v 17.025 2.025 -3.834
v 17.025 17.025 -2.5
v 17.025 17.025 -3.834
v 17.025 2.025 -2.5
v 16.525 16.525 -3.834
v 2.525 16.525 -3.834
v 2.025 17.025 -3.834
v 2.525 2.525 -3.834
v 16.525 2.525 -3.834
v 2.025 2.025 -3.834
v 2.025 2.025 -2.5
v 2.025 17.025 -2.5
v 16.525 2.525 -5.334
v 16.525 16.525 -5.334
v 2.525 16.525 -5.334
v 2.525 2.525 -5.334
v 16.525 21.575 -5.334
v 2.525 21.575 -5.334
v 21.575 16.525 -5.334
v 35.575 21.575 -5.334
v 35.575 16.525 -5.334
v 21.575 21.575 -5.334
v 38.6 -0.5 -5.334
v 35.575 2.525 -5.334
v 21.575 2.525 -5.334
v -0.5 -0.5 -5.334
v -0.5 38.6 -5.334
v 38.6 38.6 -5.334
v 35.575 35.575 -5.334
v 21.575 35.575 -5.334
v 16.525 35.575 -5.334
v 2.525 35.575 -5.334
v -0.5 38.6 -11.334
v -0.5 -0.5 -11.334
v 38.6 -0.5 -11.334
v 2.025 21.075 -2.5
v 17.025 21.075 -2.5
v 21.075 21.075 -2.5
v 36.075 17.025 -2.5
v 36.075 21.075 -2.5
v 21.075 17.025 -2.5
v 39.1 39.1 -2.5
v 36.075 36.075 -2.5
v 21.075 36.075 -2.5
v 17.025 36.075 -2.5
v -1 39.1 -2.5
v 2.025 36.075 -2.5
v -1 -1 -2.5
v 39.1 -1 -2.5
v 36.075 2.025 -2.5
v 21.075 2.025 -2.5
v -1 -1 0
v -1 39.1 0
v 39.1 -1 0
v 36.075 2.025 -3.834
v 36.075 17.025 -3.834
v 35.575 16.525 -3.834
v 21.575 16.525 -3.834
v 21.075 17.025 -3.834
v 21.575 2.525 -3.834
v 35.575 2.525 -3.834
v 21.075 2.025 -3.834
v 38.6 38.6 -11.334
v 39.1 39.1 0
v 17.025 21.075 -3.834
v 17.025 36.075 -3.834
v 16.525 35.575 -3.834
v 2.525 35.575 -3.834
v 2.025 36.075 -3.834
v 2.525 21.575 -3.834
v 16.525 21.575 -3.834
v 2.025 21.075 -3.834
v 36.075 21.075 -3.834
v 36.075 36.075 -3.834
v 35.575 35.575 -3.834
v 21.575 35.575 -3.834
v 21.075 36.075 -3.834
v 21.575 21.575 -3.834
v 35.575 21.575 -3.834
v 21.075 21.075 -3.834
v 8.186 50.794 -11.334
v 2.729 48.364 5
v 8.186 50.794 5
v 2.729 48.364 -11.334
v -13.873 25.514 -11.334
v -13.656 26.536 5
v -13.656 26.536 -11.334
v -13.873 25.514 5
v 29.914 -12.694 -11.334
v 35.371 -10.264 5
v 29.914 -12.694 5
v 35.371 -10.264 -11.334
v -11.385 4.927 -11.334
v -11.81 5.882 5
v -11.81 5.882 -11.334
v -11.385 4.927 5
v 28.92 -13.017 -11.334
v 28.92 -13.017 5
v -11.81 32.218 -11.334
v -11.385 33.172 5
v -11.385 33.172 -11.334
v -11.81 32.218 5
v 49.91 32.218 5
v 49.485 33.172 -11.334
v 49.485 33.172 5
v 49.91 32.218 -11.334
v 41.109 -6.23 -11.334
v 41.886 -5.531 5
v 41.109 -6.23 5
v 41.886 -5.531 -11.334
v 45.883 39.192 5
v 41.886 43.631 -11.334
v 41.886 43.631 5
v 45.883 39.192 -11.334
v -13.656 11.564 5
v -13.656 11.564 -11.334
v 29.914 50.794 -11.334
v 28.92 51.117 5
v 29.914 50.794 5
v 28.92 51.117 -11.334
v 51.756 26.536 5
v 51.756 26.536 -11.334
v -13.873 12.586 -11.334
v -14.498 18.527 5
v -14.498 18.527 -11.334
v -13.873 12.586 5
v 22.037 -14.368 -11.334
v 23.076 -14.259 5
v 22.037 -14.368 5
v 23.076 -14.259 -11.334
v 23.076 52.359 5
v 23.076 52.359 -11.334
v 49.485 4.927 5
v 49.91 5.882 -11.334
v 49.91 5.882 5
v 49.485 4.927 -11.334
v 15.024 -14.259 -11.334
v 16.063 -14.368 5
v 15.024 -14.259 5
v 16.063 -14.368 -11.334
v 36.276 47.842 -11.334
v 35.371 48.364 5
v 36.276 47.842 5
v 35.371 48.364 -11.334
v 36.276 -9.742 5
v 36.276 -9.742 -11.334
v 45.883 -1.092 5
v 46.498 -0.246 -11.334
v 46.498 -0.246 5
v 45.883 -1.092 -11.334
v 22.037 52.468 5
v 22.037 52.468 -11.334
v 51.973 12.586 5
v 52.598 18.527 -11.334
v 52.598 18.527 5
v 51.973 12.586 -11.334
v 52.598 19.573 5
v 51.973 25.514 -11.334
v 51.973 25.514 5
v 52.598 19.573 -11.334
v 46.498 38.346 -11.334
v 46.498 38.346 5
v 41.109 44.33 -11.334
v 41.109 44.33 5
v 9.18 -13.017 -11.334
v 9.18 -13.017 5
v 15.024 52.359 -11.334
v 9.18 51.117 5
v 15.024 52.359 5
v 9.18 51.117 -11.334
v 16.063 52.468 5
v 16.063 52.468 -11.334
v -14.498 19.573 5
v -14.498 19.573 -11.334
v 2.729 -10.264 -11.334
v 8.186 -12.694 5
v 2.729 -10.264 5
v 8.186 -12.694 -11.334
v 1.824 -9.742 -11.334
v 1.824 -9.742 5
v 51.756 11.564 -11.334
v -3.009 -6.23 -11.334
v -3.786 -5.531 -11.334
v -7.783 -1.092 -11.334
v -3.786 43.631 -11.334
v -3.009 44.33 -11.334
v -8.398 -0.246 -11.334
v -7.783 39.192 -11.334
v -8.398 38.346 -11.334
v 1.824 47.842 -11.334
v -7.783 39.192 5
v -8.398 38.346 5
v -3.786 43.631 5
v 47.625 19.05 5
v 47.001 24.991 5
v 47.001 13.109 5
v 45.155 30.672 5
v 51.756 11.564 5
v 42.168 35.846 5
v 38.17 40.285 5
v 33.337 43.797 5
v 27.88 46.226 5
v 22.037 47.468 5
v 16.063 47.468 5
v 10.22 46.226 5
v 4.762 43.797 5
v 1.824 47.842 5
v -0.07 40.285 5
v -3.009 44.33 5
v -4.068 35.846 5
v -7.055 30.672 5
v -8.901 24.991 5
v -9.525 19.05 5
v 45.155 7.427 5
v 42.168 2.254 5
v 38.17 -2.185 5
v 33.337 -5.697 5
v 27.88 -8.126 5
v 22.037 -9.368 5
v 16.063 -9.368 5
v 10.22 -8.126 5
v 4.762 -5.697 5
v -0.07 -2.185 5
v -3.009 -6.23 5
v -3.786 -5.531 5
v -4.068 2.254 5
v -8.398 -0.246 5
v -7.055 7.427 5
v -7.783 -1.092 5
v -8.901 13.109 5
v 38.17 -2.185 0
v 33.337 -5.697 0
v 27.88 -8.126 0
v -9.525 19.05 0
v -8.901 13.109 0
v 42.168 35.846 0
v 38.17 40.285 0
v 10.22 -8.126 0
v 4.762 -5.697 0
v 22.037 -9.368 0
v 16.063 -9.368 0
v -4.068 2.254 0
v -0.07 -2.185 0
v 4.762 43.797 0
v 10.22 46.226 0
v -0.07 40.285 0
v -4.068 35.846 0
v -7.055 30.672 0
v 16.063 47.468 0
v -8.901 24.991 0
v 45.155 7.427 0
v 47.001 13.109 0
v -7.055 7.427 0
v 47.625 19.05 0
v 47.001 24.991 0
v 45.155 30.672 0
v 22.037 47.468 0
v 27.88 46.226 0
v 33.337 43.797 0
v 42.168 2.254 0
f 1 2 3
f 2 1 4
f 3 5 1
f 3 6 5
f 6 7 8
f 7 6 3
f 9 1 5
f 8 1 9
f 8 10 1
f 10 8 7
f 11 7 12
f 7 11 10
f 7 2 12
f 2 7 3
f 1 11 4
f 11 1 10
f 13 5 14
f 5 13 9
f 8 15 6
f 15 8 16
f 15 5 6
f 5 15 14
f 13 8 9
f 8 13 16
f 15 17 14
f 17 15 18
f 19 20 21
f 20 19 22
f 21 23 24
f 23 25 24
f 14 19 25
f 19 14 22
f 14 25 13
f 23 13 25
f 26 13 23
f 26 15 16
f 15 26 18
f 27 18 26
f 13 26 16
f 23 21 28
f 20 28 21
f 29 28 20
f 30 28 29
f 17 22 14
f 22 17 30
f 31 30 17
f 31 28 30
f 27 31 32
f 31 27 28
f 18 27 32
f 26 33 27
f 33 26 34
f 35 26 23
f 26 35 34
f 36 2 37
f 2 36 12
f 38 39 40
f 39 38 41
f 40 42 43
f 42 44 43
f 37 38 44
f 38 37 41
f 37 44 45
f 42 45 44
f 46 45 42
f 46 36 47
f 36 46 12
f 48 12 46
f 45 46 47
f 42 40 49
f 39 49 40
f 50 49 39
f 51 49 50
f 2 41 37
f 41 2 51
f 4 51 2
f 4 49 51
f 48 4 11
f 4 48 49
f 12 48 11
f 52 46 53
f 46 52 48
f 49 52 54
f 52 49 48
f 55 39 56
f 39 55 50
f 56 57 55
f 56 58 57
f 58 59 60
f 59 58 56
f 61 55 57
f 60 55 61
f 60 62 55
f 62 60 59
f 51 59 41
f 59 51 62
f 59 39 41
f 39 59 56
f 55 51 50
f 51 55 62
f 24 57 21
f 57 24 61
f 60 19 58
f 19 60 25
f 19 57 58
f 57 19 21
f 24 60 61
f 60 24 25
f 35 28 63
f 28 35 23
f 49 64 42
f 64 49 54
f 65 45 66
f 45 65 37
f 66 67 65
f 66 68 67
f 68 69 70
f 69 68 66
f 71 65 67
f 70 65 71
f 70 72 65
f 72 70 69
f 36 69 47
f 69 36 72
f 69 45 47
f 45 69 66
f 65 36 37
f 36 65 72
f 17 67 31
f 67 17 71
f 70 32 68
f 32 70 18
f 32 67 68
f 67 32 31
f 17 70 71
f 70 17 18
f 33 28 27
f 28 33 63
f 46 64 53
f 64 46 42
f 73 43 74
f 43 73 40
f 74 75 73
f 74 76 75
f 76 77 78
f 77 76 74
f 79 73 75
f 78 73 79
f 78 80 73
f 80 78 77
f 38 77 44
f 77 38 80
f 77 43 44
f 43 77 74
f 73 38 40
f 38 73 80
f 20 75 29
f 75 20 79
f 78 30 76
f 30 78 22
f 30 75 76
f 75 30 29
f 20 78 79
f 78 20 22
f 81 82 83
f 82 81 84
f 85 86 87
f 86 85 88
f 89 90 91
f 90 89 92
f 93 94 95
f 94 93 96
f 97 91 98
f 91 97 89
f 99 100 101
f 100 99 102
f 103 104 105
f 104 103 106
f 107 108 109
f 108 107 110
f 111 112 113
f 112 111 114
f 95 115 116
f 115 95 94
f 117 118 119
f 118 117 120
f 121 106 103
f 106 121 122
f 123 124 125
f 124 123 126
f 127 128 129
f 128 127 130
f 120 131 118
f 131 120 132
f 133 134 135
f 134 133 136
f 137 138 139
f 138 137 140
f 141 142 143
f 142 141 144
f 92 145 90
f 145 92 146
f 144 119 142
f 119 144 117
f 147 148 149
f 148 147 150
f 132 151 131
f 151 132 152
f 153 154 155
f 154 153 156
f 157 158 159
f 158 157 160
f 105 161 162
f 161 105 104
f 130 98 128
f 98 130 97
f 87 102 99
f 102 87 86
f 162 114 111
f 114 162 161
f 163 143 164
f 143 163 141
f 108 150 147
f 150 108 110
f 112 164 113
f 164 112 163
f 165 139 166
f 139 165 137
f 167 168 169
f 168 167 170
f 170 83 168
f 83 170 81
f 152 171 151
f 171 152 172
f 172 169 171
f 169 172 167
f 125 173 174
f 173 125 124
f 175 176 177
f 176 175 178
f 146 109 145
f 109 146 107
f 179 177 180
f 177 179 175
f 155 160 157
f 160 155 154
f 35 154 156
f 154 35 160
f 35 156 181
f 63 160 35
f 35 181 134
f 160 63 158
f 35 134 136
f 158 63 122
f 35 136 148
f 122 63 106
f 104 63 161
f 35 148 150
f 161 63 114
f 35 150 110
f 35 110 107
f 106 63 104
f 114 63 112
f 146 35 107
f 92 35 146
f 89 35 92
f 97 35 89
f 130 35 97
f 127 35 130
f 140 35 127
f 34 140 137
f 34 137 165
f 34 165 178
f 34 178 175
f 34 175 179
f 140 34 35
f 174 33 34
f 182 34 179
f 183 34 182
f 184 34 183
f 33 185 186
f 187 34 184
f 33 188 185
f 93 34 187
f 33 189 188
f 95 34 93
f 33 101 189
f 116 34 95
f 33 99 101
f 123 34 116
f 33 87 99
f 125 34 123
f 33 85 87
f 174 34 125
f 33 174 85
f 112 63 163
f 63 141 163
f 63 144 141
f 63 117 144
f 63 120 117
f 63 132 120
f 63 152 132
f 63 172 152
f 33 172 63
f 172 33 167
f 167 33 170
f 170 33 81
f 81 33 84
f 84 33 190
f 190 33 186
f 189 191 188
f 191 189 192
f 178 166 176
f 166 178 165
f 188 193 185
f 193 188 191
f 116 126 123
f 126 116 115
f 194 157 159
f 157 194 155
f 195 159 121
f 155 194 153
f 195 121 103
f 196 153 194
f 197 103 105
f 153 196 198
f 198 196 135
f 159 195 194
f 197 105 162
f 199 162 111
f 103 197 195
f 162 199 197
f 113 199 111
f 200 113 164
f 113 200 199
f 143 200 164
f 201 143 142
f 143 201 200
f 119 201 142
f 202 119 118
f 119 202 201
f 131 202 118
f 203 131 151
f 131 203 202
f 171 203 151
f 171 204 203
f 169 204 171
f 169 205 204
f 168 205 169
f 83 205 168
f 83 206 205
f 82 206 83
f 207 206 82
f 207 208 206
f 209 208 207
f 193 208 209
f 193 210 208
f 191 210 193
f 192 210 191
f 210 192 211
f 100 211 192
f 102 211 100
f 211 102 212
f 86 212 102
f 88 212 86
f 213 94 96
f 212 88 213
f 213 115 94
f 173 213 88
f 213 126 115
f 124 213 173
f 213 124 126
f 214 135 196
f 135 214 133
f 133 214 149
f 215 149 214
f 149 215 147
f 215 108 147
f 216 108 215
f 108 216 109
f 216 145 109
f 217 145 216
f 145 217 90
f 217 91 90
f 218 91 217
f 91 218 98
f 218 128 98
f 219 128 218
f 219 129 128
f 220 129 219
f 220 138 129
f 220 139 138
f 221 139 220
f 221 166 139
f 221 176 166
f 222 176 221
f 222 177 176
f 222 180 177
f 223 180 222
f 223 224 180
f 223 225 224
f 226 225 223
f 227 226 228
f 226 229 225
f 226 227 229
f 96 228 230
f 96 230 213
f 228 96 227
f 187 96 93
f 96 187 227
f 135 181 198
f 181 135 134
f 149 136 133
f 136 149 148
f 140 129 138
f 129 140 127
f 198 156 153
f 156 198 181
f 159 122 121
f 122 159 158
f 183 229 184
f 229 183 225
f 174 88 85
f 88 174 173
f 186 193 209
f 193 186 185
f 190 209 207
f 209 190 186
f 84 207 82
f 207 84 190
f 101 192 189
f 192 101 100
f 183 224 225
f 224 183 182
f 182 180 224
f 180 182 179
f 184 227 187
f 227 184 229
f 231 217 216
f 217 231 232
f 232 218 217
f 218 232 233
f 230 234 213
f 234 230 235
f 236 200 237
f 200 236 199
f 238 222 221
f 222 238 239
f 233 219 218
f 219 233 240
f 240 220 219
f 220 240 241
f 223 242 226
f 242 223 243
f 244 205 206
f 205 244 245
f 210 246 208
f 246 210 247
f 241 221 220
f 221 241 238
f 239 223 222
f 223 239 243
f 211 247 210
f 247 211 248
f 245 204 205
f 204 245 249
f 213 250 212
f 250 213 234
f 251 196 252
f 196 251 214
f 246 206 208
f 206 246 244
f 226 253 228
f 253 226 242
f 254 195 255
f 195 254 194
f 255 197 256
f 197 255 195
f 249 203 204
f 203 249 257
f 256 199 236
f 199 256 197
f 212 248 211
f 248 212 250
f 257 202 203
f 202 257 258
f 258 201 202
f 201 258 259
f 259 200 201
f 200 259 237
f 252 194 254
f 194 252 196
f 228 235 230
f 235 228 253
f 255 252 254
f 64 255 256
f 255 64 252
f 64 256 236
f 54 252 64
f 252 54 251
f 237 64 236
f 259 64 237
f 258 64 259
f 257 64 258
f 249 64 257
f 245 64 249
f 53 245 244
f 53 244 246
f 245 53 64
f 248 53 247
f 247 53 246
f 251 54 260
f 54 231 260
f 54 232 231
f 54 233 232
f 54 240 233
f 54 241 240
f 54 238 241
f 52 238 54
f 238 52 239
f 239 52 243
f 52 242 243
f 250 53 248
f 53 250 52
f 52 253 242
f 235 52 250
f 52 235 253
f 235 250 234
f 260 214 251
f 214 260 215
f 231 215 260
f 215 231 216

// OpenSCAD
// file: ../../lib/circuits/helpers.scad
function bu(u) = u * 2.54;

module breadboard_row(number, orientation="vertical") {
  children();
  if(number > 1) {
    if(orientation == "vertical") {
      translate([0,bu(1),0])
        breadboard_row(number-1, orientation=orientation) {
          children();
        }
    } else {
      translate([bu(1),0,0])
        breadboard_row(number-1, orientation=orientation){
          children();
        }
    }
  }
}
// file: ../../lib/switches/rgb.scad
include <../variables.scad>

module rgb_row_trace_connection(width, height, xpos, ypos, rgb, connections) {
  half_width = u_mm(width)/2;
  half_height = u_mm(height)/2;
  if(connections[3] == "connect") {
    translate([1-half_width,8.875,0]){
      circle(d=0.8,$fn=40);
      offset(0.4)
        polygon(points=[[0,-0.01],[0,0.01],[u_mm(-xpos)-2, u_mm(-ypos)+0.01],[u_mm(-xpos)-2, u_mm(-ypos)-0.01]]);
    }
    translate([1-half_width,4.9,0]){
      circle(d=0.8,$fn=40);
      offset(0.4)
        polygon(points=[[0,-0.01],[0,0.01],[u_mm(-xpos)-2, u_mm(-ypos)+0.01],[u_mm(-xpos)-2, u_mm(-ypos)-0.01]]);
    }
    translate([1-half_width,3.3,0]){
      circle(d=0.8,$fn=40);
      offset(0.4)
        polygon(points=[[0,-0.01],[0,0.01],[u_mm(-xpos)-2, u_mm(-ypos)+0.01],[u_mm(-xpos)-2, u_mm(-ypos)-0.01]]);
    }
  }
  if(connections[2] == "connect") {
    translate([half_width-1,8.875,0]) {
      circle(d=0.8,$fn=40);
    }
    translate([half_width-1,4.9,0]) {
      circle(d=0.8,$fn=40);
    }
    translate([half_width-1,3.3,0]){
      circle(d=0.8,$fn=40);
    }
  }
}

module rgb_pcb_drill(width=1, height=1, rgb=true, connections=["hole","hole","hole","hole"]) {
  half_width = u_mm(width)/2;
  half_height = u_mm(height)/2;
  translate([half_width,half_height,0]) {
    if(rgb == true) {
      // LED Hole
      translate([-1.875,3.4])
        square([3.75,3]);

      // LED D
      if(connections[3] == "hole")
        translate([1.3-half_width,8,0])
          circle(d=1,$fn=40);
      if(connections[2] == "hole")
        translate([half_width-1.3,8,0])
          circle(d=1,$fn=40);

      // LED G
      if(connections[3] == "hole")
        translate([1.3-half_width,5.4,0])
          circle(d=1,$fn=40);
      if(connections[2] == "hole")
        translate([half_width-1.3,5.4,0])
          circle(d=1,$fn=40);

      // LED V
      if(connections[3] == "hole")
        translate([1.3-half_width,2.8,0])
          circle(d=1,$fn=40);
      if(connections[2] == "hole")
        translate([half_width-1.3,2.8,0])
          circle(d=1,$fn=40);
    }

    children();
  }
}

module rgb_pcb_hole_traces(width=1, height=1, rgb=true, xpos=0, ypos=0, connections=["hole","hole","hole","hole"]) {
  half_width = u_mm(width)/2;
  half_height = u_mm(height)/2;
  translate([half_width,half_height,0]) {
    if(rgb == true) {
      // LED D
      if(connections[3] == "hole")
        translate([1.3-half_width,8,0])
          circle(d=2.5,$fn=40);
      if(connections[2] == "hole")
        translate([half_width-1.3,8,0])
          circle(d=2.5,$fn=40);

      // LED G
      if(connections[3] == "hole")
        translate([1.3-half_width,5.4,0])
          circle(d=2.5,$fn=40);
      if(connections[2] == "hole")
        translate([half_width-1.3,5.4,0])
          circle(d=2.5,$fn=40);

      // LED V
      if(connections[3] == "hole")
        translate([1.3-half_width,2.8,0])
          circle(d=2.5,$fn=40);
      if(connections[2] == "hole")
        translate([half_width-1.3,2.8,0])
          circle(d=2.5,$fn=40);
    }

    children();
  }
}

module rgb_pcb_traces(width=1, height=1, rgb=true, xpos=0, ypos=0, connections=["hole","hole","hole","hole"]) {
  half_width = u_mm(width)/2;
  half_height = u_mm(height)/2;
  rgb_pcb_hole_traces(width=width, height=height, rgb=rgb, connections=connections) {
    if(rgb == true) {
      rgb_row_trace_connection(width=width, height=height, xpos=xpos, ypos=ypos, rgb=rgb, connections=connections);
      v_left = connections[3] == "none" ? 1 : half_width-5;
      // LED G
      translate([1.25,5])
        square([2,2]);
      translate([2.7,8.5,0]) {
        length = connections[2] == "none" ? 2 : half_width-3.7; 
        square([length,0.75]);
      }
      translate([2.7,6.8])
        square([0.8,2.4]);
      translate([-3.5,6.2])
        square([7,0.8]);
      translate([-3.5,6.8])
        square([0.8,2.4]);
      translate([-4-v_left,8.5,0])
        square([v_left+1,0.75]);

      // LED D
      translate([-4-v_left,4.5,0])
        square([v_left,0.8]);
      translate([-4.5,4.5,0])
        square([0.8,1.3]);
      translate([-4.5,5,0])
        square([1.3,0.8]);
      translate([2,4,0])
        square([2,0.8]);
      translate([4,4,0])
        square([0.8,1.3]);
      translate([4,4.5,0]) {
        length = connections[2] == "none" ? 0 : half_width-5; 
        square([length,0.75]);
      }
      translate([-3.375,5])
        square([2,1.1]);
      translate([1.25,3.75])
        square([2,1.1]);

      // LED V
      v_right = connections[2] == "none" ? 0 : half_width-5.25;
      translate([-4-v_left,2.9,0])
        square([v_right+v_left+8.875,0.8]);
      translate([-3.375,3.5])
        square([2,1.35]);
    }

    children();
  }
}
// file: ../../lib/switches/base.scad
include <../variables.scad>
include <rgb.scad>

// ["top", "bottom", "left", "right"]

module switch_row_trace_connection(width, height, xpos, ypos, rgb, connections) {
  half_width = u_mm(width)/2;
  half_height = u_mm(height)/2;
  if(connections[3] == "connect") {
    translate([1-half_width,-5.5,0]){
      circle(d=0.8,$fn=40);
      offset(0.4)
        polygon(points=[[0,-0.01],[0,0.01],[u_mm(-xpos)-2, u_mm(-ypos)+0.01],[u_mm(-xpos)-2, u_mm(-ypos)-0.01]]);
    }
  }
  if(connections[2] == "connect") {
    translate([half_width-1,-5.5,0]) {
      circle(d=0.8,$fn=40);
    }
  }
}

module switch_column_trace_connection(width, height, xpos, ypos, rgb, connections, last_xpos=0, last_ypos=0) {
  half_width = u_mm(width)/2;
  half_height = u_mm(height)/2;
  if(connections[1] == "connect") {
    translate([-u_mm((width-1)/2)-0.9,half_height-1,0]) {
      circle(d=0.8,$fn=40);
      offset(0.4)
        polygon(points=[[0,-0.01],[0,0.01],[u_mm((width-1)/2),0.01],[u_mm((width-1)/2),-0.01]]);
    }
  }
  if(connections[0] == "connect") {
    y_off = u_mm(ypos-last_ypos);
    x_off = u_mm(last_xpos-xpos);
    translate([-0.875,-1-y_off-half_height,0]) {
      offset(0.4)
        polygon(points=[[-0.01+x_off,0],[0.01+x_off,0],[0.01,2+y_off],[-0.01,2+y_off]]);
      translate([x_off-0.01,0]) {
        offset(0.4)
          polygon(points=[[0,-0.01],[0,0.01],[u_mm((width-1)/2)+1,0.01],[u_mm((width-1)/2)+1,-0.01]]);
      }
    }
  }
}

module switch_base_pcb_drill(width=1, height=1, rgb=true, single=true, connections=["hole","hole","hole","hole"]) {
  half_width = u_mm(width)/2;
  half_height = u_mm(height)/2;
  rgb_pcb_drill(width=width, height=height, rgb=rgb, connections=connections) {
    // Row
    if(connections[2] == "hole")
      translate([half_width-1.3,-5.5,0])
        circle(d=1,$fn=40);
    if(connections[3] == "hole")
      translate([1.3-half_width,-5.5,0])
        circle(d=1,$fn=40);

    // Column
    if(connections[1] == "hole")
      translate([-1,half_height-1.25,0])
        circle(d=1,$fn=40);
    if(connections[0] == "hole")
      translate([-1,1.25-half_height,0])
        circle(d=1,$fn=40);

    children();
  }
}

module switch_base_pcb_traces(width=1, height=1, rgb=true, xpos=0, ypos=0, connections=["hole","hole","hole","hole"], last_xpos=0, last_ypos=0, single=true) {
  half_width = u_mm(width)/2;
  half_height = u_mm(height)/2;
  rgb_pcb_traces(width=width, height=height, rgb=rgb, xpos=xpos, ypos=ypos, connections=connections) {
    switch_row_trace_connection(width, height, xpos, ypos, rgb, connections);
    if(single && !rgb)
      switch_column_trace_connection(width, height, xpos, ypos, rgb, connections, last_xpos=last_xpos, last_ypos=last_ypos);

    // Row
    if(connections[2] == "hole")
      translate([half_width-1.3,-5.5,0])
        circle(d=2.5,$fn=40);
    if(connections[3] == "hole")
      translate([1.3-half_width,-5.5,0])
        circle(d=2.5,$fn=40);

    // Column
    if(connections[1] == "hole")
      translate([-1,half_height-1.25,0])
        circle(d=2.4,$fn=40);
    if(connections[0] == "hole")
      translate([-1,1.25-half_height,0])
        circle(d=2.4,$fn=40);

    children();
  }
}

module switch_base_pcb_traces_bottom(width=1, height=1, rgb=true, xpos=0, ypos=0, connections=["hole","hole","hole","hole"], last_xpos=0, last_ypos=0) {
  half_width = u_mm(width)/2;
  half_height = u_mm(height)/2;
  rgb_pcb_hole_traces(width=width, height=height, rgb=rgb, connections=connections) {
    switch_column_trace_connection(width, height, xpos, ypos, rgb, connections, last_xpos=last_xpos, last_ypos=last_ypos);

    // Row
    if(connections[2] == "hole")
      translate([half_width-1.3,-5.5,0])
        circle(d=2.5,$fn=40);
    if(connections[3] == "hole")
      translate([1.3-half_width,-5.5,0])
        circle(d=2.5,$fn=40);

    // Column
    if(connections[1] == "hole")
      translate([-1,half_height-1.25,0])
        circle(d=2.5,$fn=40);
    if(connections[0] == "hole")
      translate([-1,1.25-half_height,0])
        circle(d=2.5,$fn=40);

    children();
  }
}
// file: ../../lib/switches/footprints.scad
include <../variables.scad>
include <stabilizers.scad>

module pcb_switch_outline(width=1, height=1) {
  stab_extra = width >= 2 ? 2 : 0;
  translate([0,-stab_extra])
    square([u_mm(width)+0.01, u_mm(height)+0.01+stab_extra]);
}

module pcb_switch_space_outline(width=1, height=1, style="mx", cnc=false) {
  offset = height_for_style(style);
  stab_extra = width >= 2 ? 2 : 0;
  translate([-1,-1-stab_extra,2.834-offset])
    cube([u_mm(width) + 2, u_mm(height) + 2 + stab_extra, 1.166+offset]);
  translate([u_mm(width/2),u_mm(height/2)]) {
    translate([-7.5,-7.5,1.5-offset])
      cube([15,15,5]);
    translate([-7,-7,-10])
      cube([14,14,10]);
    translate([u_mm(-width/2)-0.5,u_mm(-height/2)-0.5,-20-offset])
      cube([u_mm(width)+1,u_mm(height)+1, 20]);
  }
  translate([hole_offset(width), hole_offset(height),-10])
    stab(width);
}
// file: ../../lib/switches/stabilizers.scad
module stab_hole_render(distance){
  translate([14+distance+3.375,6.99,0]) {
    circle(d=3.175, $fn=40);
    translate([0,-15.24,0])
      circle(d=4.064, $fn=40);
  }
  translate([-6.75-distance+3.375,6.99,0]) {
    circle(d=3.175, $fn=40);
    translate([0,-15.24,0])
      circle(d=4.064, $fn=40);
  }
}

module stab_holes(width) {
  if (width >= 7) {
    stab_hole_render(39.6);
  } else if (width >= 6) {
    stab_hole_render(39.6);
  } else if(width >= 2) {
    stab_hole_render(1.6);
  }
}

module stab_render(distance, cnc=false, height=5.334) {
  translate([14+distance,1.47,0]){
    // Right Side Large Hole
    cube([6.75,12.3,10]);

    // Add 1/16" corner holes for milling
    if(cnc){
      translate([0.56,0.56,0])
        cylinder(h=10,d=1.59,$fn=20);
      translate([6.75-0.56,0.56,0])
        cylinder(h=10,d=1.59,$fn=20);
      translate([0.56,12.3-0.56,0])
        cylinder(h=10,d=1.59,$fn=20);
      translate([6.75-0.56,12.3-0.56,0])
        cylinder(h=10,d=1.59,$fn=20);
    }
    translate([5.75,3.23,0]){
      // Side hole for notch
      cube([1.825,3.175,10]);
      translate([1.825,1.59,0])
        if(cnc)
          resize([1.59,3.175,10])
            cylinder(h=10,d=1.59,$fn=20);
    }
    translate([1.725,11.3,0]){
      // Top Notch
      cube([3.3,2.2,10]);
      if(cnc)
        translate([1.65,2.2,0])
          resize([3.3,1,10])
            cylinder(h=10,d=1,$fn=20);
    }
    // Thin out for clip
    translate([-1,-1,10-height+1.5])
      cube([8.75,14.3,height-1.5]);
  }
  translate([-6.75-distance,1.47,0]){
    // Left Side Large Hole
    cube([6.75,12.3,10]);
    translate([-0.825,3.23,0]){
      // Side hole for notch
      cube([1.825,3.175,10]);
      if(cnc)
        translate([0,1.59,0])
          resize([1.59,3.175,10])
            cylinder(h=10,d=1.59,$fn=20);

    }
    translate([1.725,11.3,0]){
      // Top Notch
      cube([3.3,2.2,10]);
      if(cnc)
        translate([1.65,2.2,0])
          resize([3.3,1,10])
            cylinder(h=10,d=1,$fn=20);
    }
    if(cnc){
      translate([0.56,0.56,0])
        cylinder(h=10,d=1.59,$fn=20);
      translate([6.75-0.56,0.56,0])
        cylinder(h=10,d=1.59,$fn=20);
      translate([0.56,12.3-0.56,0])
        cylinder(h=10,d=1.59,$fn=20);
      translate([6.75-0.56,12.3-0.56,0])
        cylinder(h=10,d=1.59,$fn=20);
    }
    // Thin out for clip
    translate([-1,-1,10-height+1.5])
      cube([8.75,14.3,height-1.5]);
  }
  // Center shaft for bar
  translate([-distance-2,4.7,0]){
    cube([distance*2+20,4.6,10]);
  }
}

module stab(key_width, cnc=false) {
  if (key_width >= 7) {
    stab_render(39.6, cnc=cnc);
  } else if (key_width >= 6) {
    stab_render(39.6, cnc=cnc);
  } else if(key_width >= 2) {
    stab_render(1.6, cnc=cnc);
  }
}
// file: ../../lib/circuits/wire.scad
module guage(guage=12) {
  fn=20;
  if(guage == 8) {
    circle(d=3.25, $fn=fn);
  } else if (guage == 10) {
    circle(d=2.59, $fn=fn);
  } else if (guage == 12) {
    circle(d=2.06, $fn=fn);
  } else if (guage == 14) {
    circle(d=1.57, $fn=fn);
  } else if (guage == 16) {
    circle(d=1.3, $fn=fn);
  }
}

module wire_pcb_drill(guage=12) {
  offset(0.1)
    guage(guage);
}

module wire_pcb_traces(guage=12) {
  offset(0.75)
    guage(guage);
}

module wire_pcb_outline(guage=12) {
  offset(1.5)
    guage(guage);
}

module wire_space_outline(guage=12) {
  linear_extrude(10)
    offset(0.1)
      guage(guage);
}
// file: ../../lib/circuits/trrs.scad
module trrs_post(d=1.2) {
  translate([0,-d/4,0]) {
    circle(d=d, $fn=20);
    translate([-d/2,0,0]) {
      square([d,(d/2-.2)]);
    }
    translate([0,(d/2-.2),0]) {
      circle(d=d, $fn=20);
    }
  }
}

module trrs_pcb_drill(side="left") {
  translate([2.8,1.5]) {
    circle(d=2, $fn=20);
  }
  translate([2.8,8.5]) {
    circle(d=2, $fn=20);
  }
  translate([0.5,11.3,0]) {
    trrs_post();
  }
  translate([5.1,3.2,0]) {
    trrs_post();
  }
  translate([5.1,6.2,0]) {
    trrs_post();
  }
  translate([5.1,10.2,0]) {
    trrs_post();
  }
  if(side != "none"){
    offset = side == "left" ? 7.6 : -2;
    translate([offset,11.3]) {
      circle(d=1.2, $fn=20);
    }
    translate([offset,8.3]) {
      circle(d=1.2, $fn=20);
    }
    translate([offset,5.3]) {
      circle(d=1.2, $fn=20);
    }
    translate([offset,2.2]) {
      circle(d=1.2, $fn=20);
    }
  }
}

module trrs_pcb_traces(side="left") {
  translate([-1,9.7,0]){
    difference() {
      square([3,3]);
      if(side == "right") {
        translate([3,-1.8]) {
          rotate(45) {
            square(2);
          }
        }
      }
    }
  }
  translate([3.6,1.2,0]){
    difference() {
      square([3,3.5]);
      if(side == "left") {
        translate([3,2.3]) {
          rotate(45) {
            square(2);
          }
        }
      }
    }
  }
  translate([3.6,4.8,0]){
    difference() {
        square([3,3.5]);
        if(side == "left") {
          translate([3,2.3]) {
            rotate(45) {
              square(2);
            }
          }
        }
    }
  }
  translate([3.6,8.4,0]){
    difference() {
      square([3,3.2]);
      if(side == "left") {
        translate([3,1.8]) {
          rotate(45) {
            square(2);
          }
        }
      }
    }
  }
  if(side != "none"){
    translate([side == "left" ? 7.6 : -2,0,0]){
      translate([0,11.3]) {
        circle(d=3, $fn=20);
      }
      translate([0,8.3]) {
        circle(d=2.9, $fn=20);
      }
      translate([0,5.3]) {
        circle(d=3, $fn=20);
      }
      translate([0,2.2]) {
        circle(d=3, $fn=20);
      }
    }
    translate([side == "left" ? 5.6 : -2,0,0]){
      left_trace = side == "left" ? 2.5 : 7.6;
      translate([0,2.2]) {
        square([left_trace,1.5]);
      }
      translate([0,5.1]) {
        square([left_trace,1.5]);
      }
      if(side == "left") {
        translate([0,8.7]) {
          square([left_trace,0.9]);
        }
      }
      else {
        translate([0,8]) {
          square([4,1.6]);
        }
        translate([4,9]) {
          square([4,1.6]);
        }
        translate([2.8,9.4]) {
          rotate(-45) {
            square([1,1.7]);
          }
        }
      }
    }
    translate([side == "left" ? 0.5 : -2,0,0]){
      right_trace = side == "left" ? 7.1 : 2;
      translate([0,11.7]) {
        square([right_trace,1.3]);
      }
      translate([0,12]) {
        circle(1, $fn=20);
      }
      translate([right_trace,11.8]) {
        circle(1, $fn=20);
      }
    }
  }
}

module trrs_pcb_outline(side="left") {
  translate([-1,0,0]) {
    square([7.6,13.1]);
  }
  if(side != "none"){
    translate([side == "left" ? 5.6 : -3.5, 0]) {
      square([4,13.1]);
    }
  }
}

module trrs_space_outline(side="left") {
  translate([0,0,-5.3]) {
    linear_extrude(7){
      translate([-2,-1,0])
        square([9.6,15.1]);
      translate([0,-12.1,0])
        square([5.6,12.1]);
      if(side != "none")
        translate([side == "left" ? 5.6 : -4.5, -1])
          square([5,15.1]);
    }
  }
  translate([3,-2,-2.6]) {
    rotate([90,0,0]) {
      cylinder(d=10, h=30, $fn=100);
    }
  }
}
// file: ../../lib/circuits/trace.scad
function vdef(vector, index) = len(vector) == index ? vector[index-1] : vector[index];
function vadd(vector, index, axis) = vdef(vector, index)[axis] > vdef(vector, index-1)[axis] ? 0.01 : -0.01;
function polygon_from_vector(vector) = 
  len(vector) > 0 ?
    concat(vector, 
      [for (i = [1:len(vector)]) 
        [vector[len(vector)-i][0]-vadd(vector, i, 0),vector[len(vector)-i][1]-vadd(vector, i, 1)]])
      : [];

function parse_loc(loc) = [
  loc[5],
  len(loc) < 7 ? "both" : loc[6],
  len(loc) < 8 ? "none" : loc[7],
];

module manual_trace_pcb_drill(location) {
  vector = parse_loc(location)[0];
  echo("holes", parse_loc(location)[2]);
  if(parse_loc(location)[2] == "holes" || parse_loc(location)[2] == "hole_begin") {
    translate(vector[0]) {
      circle(d=1, $fn=20);
    }
  }
  if(parse_loc(location)[2] == "holes" || parse_loc(location)[2] == "hole_end") {
    translate(vector[len(vector)-1]) {
      circle(d=1, $fn=20);
    }
  }
}

module manual_trace_pcb_traces(location) {
  vector = parse_loc(location)[0];
  if(parse_loc(location)[1] != "bottom") {
    offset(0.4) {
      polygon(points=polygon_from_vector(vector));
    }
  }
  if(parse_loc(location)[2] == "holes" || parse_loc(location)[2] == "hole_begin") {
    translate(vector[0]) {
      circle(d=2.5, $fn=20);
    }
  }
  if(parse_loc(location)[2] == "holes" || parse_loc(location)[2] == "hole_end") {
    translate(vector[len(vector)-1]) {
      circle(d=2.5, $fn=20);
    }
  }
}

module manual_trace_pcb_traces_bottom(location) {
  vector = parse_loc(location)[0];
  if(parse_loc(location)[1] != "top") {
    offset(0.4) {
      polygon(points=polygon_from_vector(vector));
    }
  }
  if(parse_loc(location)[2] == "holes" || parse_loc(location)[2] == "hole_begin") {
    translate(vector[0]) {
      circle(d=2.5, $fn=20);
    }
  }
  if(parse_loc(location)[2] == "holes" || parse_loc(location)[2] == "hole_end") {
    translate(vector[len(vector)-1]) {
      circle(d=2.5, $fn=20);
    }
  }
}

module manual_trace_pcb_outline(location) {
  vector = parse_loc(location)[0];
  echo("location", location);
  offset(1)
    polygon(points=polygon_from_vector(vector));

  if(parse_loc(location)[2] == "holes" || parse_loc(location)[2] == "hole_begin") {
    translate(vector[0]) {
      circle(d=4, $fn=20);
    }
  }
  if(parse_loc(location)[2] == "holes" || parse_loc(location)[2] == "hole_end") {
    translate(vector[len(vector)-1]) {
      circle(d=4, $fn=20);
    }
  }
}

module manual_trace_space_outline(location) {
  vector = parse_loc(location)[0];
  translate([0,0,-1])
    linear_extrude(2)
      offset(0.5)
        manual_trace_pcb_outline(vector);
}
// file: ../../lib/circuits/support.scad
module support_pcb_drill(mm=2) {
  offset(0.1)
    circle(d=mm, $fn=20);
}

module support_pcb_traces(mm=2) {
}

module support_pcb_outline(mm=2) {
  offset(2)
    circle(d=mm, $fn=20);
}

module support_space_outline(mm=2) {
  linear_extrude(10)
    offset(0.1)
      circle(d=mm, $fn=20);
}
// file: ../../lib/circuits/proton_c.scad
use <helpers.scad>

module proton_c_pcb_drill(size="full") {
  translate([bu(0.5),bu(1.5),0]) {
    translate([0,bu(1)])
      breadboard_row(4, "horizontal"){
        circle(d=1, $fn=20);
        translate([0,bu(1)])
          circle(d=1, $fn=20);
      }
    translate([bu(4),bu(1)])
      breadboard_row(2)
        circle(d=1, $fn=20);
    translate([bu(4),bu(3)])
      breadboard_row(2)
        circle(d=1, $fn=20);
    circle(d=1, $fn=20);
    translate([bu(1),0,0])
      circle(d=1, $fn=20);
    translate([bu(5),0,0])
      circle(d=1, $fn=20);
    translate([bu(6),0,0])
      circle(d=1, $fn=20);
    breadboard_row(12) {
      circle(d=1, $fn=20);
      translate([bu(1),0,0])
        circle(d=1, $fn=20);
      translate([bu(5),0,0])
        circle(d=1, $fn=20);
      translate([bu(6),0,0])
        circle(d=1, $fn=20);
    }
    if(size == "full")
      translate([0,bu(13)])
        breadboard_row(6) {
          circle(d=1, $fn=20);
          translate([bu(1),0,0])
            circle(d=1, $fn=20);
          translate([bu(5),0,0])
            circle(d=1, $fn=20);
          translate([bu(6),0,0])
            circle(d=1, $fn=20);
    }
  }
}

module proton_c_pcb_traces(size="full") {
  translate([bu(0.5),bu(1.5),0]) {
    translate([0,bu(1)])
      breadboard_row(4, "horizontal"){
        circle(d=2.4, $fn=20);
        translate([-1,0])
          square([2,bu(1)]);
        translate([0,bu(1)])
          circle(d=2.4, $fn=20);
      }
    translate([0,bu(1)])
      breadboard_row(2) {
        translate([bu(5),0])
          circle(d=2.4, $fn=20);
        translate([bu(5),-1,0])
          square([bu(1),2]);
        translate([bu(6),0,0])
          circle(d=2.4, $fn=20);
      }
    translate([bu(4),bu(1)]){
      translate([-0.75,-1])
        square([1.5,bu(2)-2]);
      breadboard_row(2)
        circle(d=2.4, $fn=20);
      translate([0,-0.75])
        square([bu(2),1.5]);
    }
    translate([bu(4),bu(3)]){
      translate([-0.75,-1])
        square([1.5,bu(2)-2]);
      breadboard_row(2)
        circle(d=2.4, $fn=20);
      translate([0,-0.75])
        square([bu(2),1.5]);
    }
    circle(d=2.4, $fn=20);
    translate([0,-1,0])
      square([bu(1),2]);
    translate([bu(1),0,0])
      circle(d=2.4, $fn=20);
    translate([bu(5),0])
      circle(d=2.4, $fn=20);
    translate([bu(5),-1,0])
      square([bu(1),2]);
    translate([bu(6),0,0])
      circle(d=2.4, $fn=20);
    translate([0,bu(3)])
      breadboard_row(9) {
        circle(d=2.4, $fn=20);
        translate([0,-1,0])
          square([bu(1),2]);
        translate([bu(1),0,0])
          circle(d=2.4, $fn=20);
        translate([bu(5),0])
          circle(d=2.4, $fn=20);
        translate([bu(5),-1,0])
          square([bu(1),2]);
        translate([bu(6),0,0])
          circle(d=2.4, $fn=20);
      }
    if(size == "full")
      translate([0,bu(13)])
        breadboard_row(6) {
          circle(d=2.4, $fn=20);
          translate([0,-1,0])
            square([bu(1),2]);
          translate([bu(1),0,0])
            circle(d=2.4, $fn=20);
          translate([bu(5),0])
            circle(d=2.4, $fn=20);
          translate([bu(5),-1,0])
            square([bu(1),2]);
          translate([bu(6),0,0])
            circle(d=2.4, $fn=20);
        }
  }
}

module proton_c_pcb_outline(size="full") {
  translate([0,bu(1)])
  square([bu(7), bu(size == "full" ? 19 : 12)]);
}

module proton_c_space_outline(size="full") {
  translate([0,0,-4]) {
    linear_extrude(6) {
      translate([-bu(0.5),-bu(0.5)])
        square([bu(8), bu(size == "full" ? 21 : 14)]);
    }
    linear_extrude(5) {
      translate([bu(0.5),-bu(15),0])
        square([bu(6),bu(25)]);
    }
  }
}
// file: ../../lib/circuits/pro_micro.scad
use <helpers.scad>

module pro_micro_pcb_drill(connections="holes") {
  translate([bu(0.5),bu(1.5),0]) {
    if(connections == "holes"){
      translate([bu(3),bu(1)])
        breadboard_row(3)
          circle(d=1, $fn=20);
      translate([bu(4),bu(3)])
        breadboard_row(3)
          circle(d=1, $fn=20);
    }
    breadboard_row(12) {
      circle(d=1, $fn=20);
      if(connections == "holes") {
        translate([bu(1),0,0])
          circle(d=1, $fn=20);
        translate([bu(5),0,0])
          circle(d=1, $fn=20);
      }
      translate([bu(6),0,0])
        circle(d=1, $fn=20);
    }
  }
}

module pro_micro_pcb_traces(connections="holes") {
  translate([bu(0.5),bu(1.5),0]) {
    // GRND
    if(connections == "holes"){
      translate([bu(3),bu(1)]){
        translate([-0.75,-1])
          square([1.5,bu(3)-2]);
        breadboard_row(3)
          circle(d=2.4, $fn=20);
        translate([0,-0.75])
          square([bu(2),1.5]);
      }
      translate([bu(4),bu(3)]){
        translate([-0.75,-1])
          square([1.5,bu(3)-2]);
        breadboard_row(3)
          circle(d=2.4, $fn=20);
        translate([0,-0.75])
          square([bu(2),1.5]);
      }
    }
    breadboard_row(12) {
      circle(d=2.4, $fn=20);
      if(connections == "holes") {
        translate([0,-1,0])
          square([bu(1),2]);
        translate([bu(1),0,0])
          circle(d=2.4, $fn=20);
        translate([bu(5),0])  
          circle(d=2.4, $fn=20);
        translate([bu(5),-1,0])
          square([bu(1),2]);
      }
      translate([bu(6),0,0])
        circle(d=2.4, $fn=20);
    }
  }
}

module pro_micro_pcb_outline() {
  translate([0,bu(1)])
  square([bu(7), bu(12)]);
}

module pro_micro_space_outline() {
  translate([0,0,-4]) {
    linear_extrude(6) {
      translate([-bu(0.5),-bu(0.5)])
        square([bu(8), bu(14)]);
    }
    linear_extrude(5) {
      translate([bu(0.5),-bu(15),0])
        square([bu(6),bu(25)]);
    }
  }
}
// file: ../../lib/circuits/mts_101.scad
use <../variables.scad>
module mts_101_pcb_drill() {
  translate([0,1.25]) {
    translate([2.5,0])
      square([3,1]);
    translate([1.25,0.5])
      circle(d=1,$fn=40);
    translate([6.75,0.5])
      circle(d=1,$fn=40);

    translate([2.5,4.75])
      square([3,1]);
    translate([1.25,5.25])
      circle(d=1,$fn=40);
    translate([6.75,5.25])
      circle(d=1,$fn=40);

    translate([4,10])
      circle(d=1,$fn=40);
    translate([1.25,10])
      circle(d=1,$fn=40);
    translate([6.75,10])
      circle(d=1,$fn=40);
  }
}

module mts_101_pcb_traces() {
  translate([0,1.25]) {
    translate([2,-0.5])
      square([4,2]);
    translate([1.25,0.5])
      circle(d=2,$fn=40);
    translate([6.75,0.5])
      circle(d=2,$fn=40);

    translate([2,4.25])
      square([4,2]);
    translate([1.25,5.25])
      circle(d=2,$fn=40);
    translate([6.75,5.25])
      circle(d=2,$fn=40);

    translate([4,10])
      circle(d=2,$fn=40);
    translate([1.25,9.5])
      square([6,1]);
    translate([1.25,10])
      circle(d=2,$fn=40);
    translate([6.75,10])
      circle(d=2,$fn=40);
  }
}

module mts_101_pcb_outline() {
  square([8,13]);
}

module mts_101_space_outline(, cnc=false) {
  translate([-0.5,-0.5,-10])
    cube([9,14, 14.4]);
  translate([4,6.5,-26]) {
    cylinder(d=6, h=18, $fn=30);
    cylinder(d=12, h=10, $fn=60);
  }
}
// file: ../../lib/circuits/ec11.scad
use <../variables.scad>
use <../switches/base.scad>

module 1u_centered() {
  translate([u_mm(0.5),u_mm(0.5)])
    children();
}

module ec11_pcb_drill(single=false, connections=["hole","hole","hole","hole"]) {
  switch_base_pcb_drill(rgb=false, connections=connections) {
    // Key Column
    translate([-3,0,0])
      circle(d=1,$fn=40);

    // Key Row
    translate([7,2.5])
      circle(d=1, $fn=20);

    if(single) {
      translate([4.25,-3,0])
        circle(d=1, $fn=20);
      translate([-3,-3.25,0])
        circle(d=1,$fn=40);
    }
    translate([4.25,0,0])
      circle(d=1, $fn=20);

    translate([7,-2.5])
      circle(d=1, $fn=20);

    if(connections[3] == "hole"){
      translate([-5.5,2.5])
        circle(d=1, $fn=20);
      translate([-5.5,0])
        circle(d=1, $fn=20);
      translate([-5.5,-2.5])
        circle(d=1, $fn=20);
    }
    translate([-7.5,-2.5])
      circle(d=1, $fn=20);
    translate([-7.5,2.5])
      circle(d=1, $fn=20);
    translate([-7.5,0])
      circle(d=1, $fn=20);

    translate([-1.3,-6.25])
      square([2.6,1.5]);
    translate([-1.3,4.75])
      square([2.6,1.5]);
  }
}

module ec11_pcb_traces(single=false, connections=["hole","hole","hole","hole"]) {
  switch_base_pcb_traces(single=single, rgb=false, connections=connections) {
    // Key Row
    if(single){
      translate([2,2.2])
        square([4.5,0.8]);
      r_len = connections[0] != "none" ? u_mm(0.5)-1 : 6;
      l_len = connections[1] != "none" ? u_mm(0.5)-1 : 6;
      translate([2,-r_len])
        square([0.8,r_len+l_len]);
      if(connections[0] != "none")
        translate([-2,1-u_mm(0.5)])
          square([4,0.8]);
      if(connections[1] != "none")
        translate([-2.1,u_mm(0.5)-1.6])
          square([4.9,0.8]);
    }
    translate([7,2.5])
      circle(d=2.5,$fn=40);

    // Key Column
    if(connections[3] != "none")
      translate([1-u_mm(0.5),-6])
        square([u_mm(0.5)-4,1]);
    translate([-3.25,-6])
      square([0.8,5]);
    translate([-3,0])
      circle(d=2.5,$fn=40);

    if(single){
      translate([-3,-3.25])
        circle(d=2.5,$fn=40);
      translate([4.25,-3])
        circle(d=2.5,$fn=40);
    } else {
      translate([-3,-3.25])
        square([7.8,0.8]);
    }

    translate([7,-2.5])
      circle(d=2.5,$fn=40);
    translate([4.25,0]) {
      circle(d=2.5,$fn=40);
      rotate(-45)
        square([5,0.8]);
    }

    translate([4,-6])
      square([0.8,3]);
    if(connections[2] != "none")
      translate([4,-6])
        square([4.5,0.8]);

    if(connections[3] == "hole"){
      translate([-5.5,2.5])
        circle(d=2.25, $fn=20);
      translate([-5.5,0])
        circle(d=2.25, $fn=20);
      translate([-5.5,-2.5])
        circle(d=2.25, $fn=20);
    }
    translate([-7.5,-2.5])
      circle(d=2.25, $fn=20);
    translate([-7.5,2.5])
      circle(d=2.25, $fn=20);
    translate([-7.5,0])
      circle(d=2.25, $fn=20);
  }
}

module ec11_pcb_traces_bottom(connections=["hole","hole","hole","hole"]) {
  switch_base_pcb_traces_bottom(rgb=false, connections=connections) {
    // Key Row
    translate([2,2.2])
      square([4.5,0.8]);
    r_len = connections[0] != "none" ? u_mm(0.5)-1 : 6;
    l_len = connections[1] != "none" ? u_mm(0.5)-1 : 6;
    translate([2,-r_len])
      square([0.8,r_len+l_len]);
    
    if(connections[0] != "none")
      translate([-1.3,1-u_mm(0.5)])
        square([4,0.8]);
    if(connections[1] != "none")
      translate([-1,u_mm(0.5)-1.4])
        square([3.8,0.8]);
    translate([7,2.5])
      circle(d=2.5,$fn=40);

    // Key Column
    translate([-3,0])
      circle(d=2.5,$fn=40);

    translate([7,-2.5])
      circle(d=2.5,$fn=40);
    translate([4.25,0]) {
      circle(d=2.5,$fn=40);
    }

    if(connections[3] == "hole"){
      translate([-5.5,2.5])
        circle(d=2.25, $fn=20);
      translate([-5.5,0])
        circle(d=2.25, $fn=20);
      translate([-5.5,-2.5])
        circle(d=2.25, $fn=20);
    }
    translate([-7.5,-2.5])
      circle(d=2.25, $fn=20);
    translate([-7.5,2.5])
      circle(d=2.25, $fn=20);
    translate([-7.5,0])
      circle(d=2.25, $fn=20);
  }
}

module ec11_pcb_outline() {
  square([u_mm(1), u_mm(1)]);
}

module ec11_space_outline() {
  translate([-0.5,-0.5, -6])
    cube([u_mm(1)+1, u_mm(1)+1, 8]);
  1u_centered() {
    translate([0,0,-15])
      linear_extrude(15)
        circle(d=7, $fn=30);
    translate([0,0,-25])
      linear_extrude(15)
        circle(d=19, $fn=80);
  }
}
// file: ../../lib/switches/choc_v1.scad
include <../variables.scad>
include <stabilizers.scad>
include <footprints.scad>

module switch_choc_v1_pcb_drill(width=1, height=1) {
  half_width = u_mm(width)/2;
  half_height = u_mm(height)/2;
  translate([half_width,half_height,0]) {
    circle(d=3.5, $fn=30);

    translate([-5.5,0])
      circle(d=2, $fn=30);
    translate([3,3.8])
      circle(d=1, $fn=30);
    translate([-4, 3.8])
      circle(d=1, $fn=30);
    translate([-4,1.25-half_height])
      circle(d=1, $fn=30);
    translate([-4, half_height-3])
      circle(d=1, $fn=30);

    translate([5.5,0])
      circle(d=2, $fn=30);
    translate([0,5.9])
      circle(d=1.3, $fn=30);
    translate([5,3.8])
      circle(d=1.3, $fn=30);
    translate([1-half_width, half_height-1])
      circle(d=1, $fn=30);
    translate([half_width-1, half_height-1])
      circle(d=1, $fn=30);
  }
}

module switch_choc_v1_pcb_traces(width=1, height=1) {
  half_width = u_mm(width)/2;
  half_height = u_mm(height)/2;
  translate([half_width,half_height,0]) {
    translate([5,3.8])
      circle(d=2.8, $fn=30);
    translate([3,3.8])
      circle(d=2.5, $fn=30);
    translate([-4, 3.8])
      circle(d=2.5, $fn=30);
    translate([-4.5, 2-half_height])
      square([1, u_mm(height)-4]);
    translate([-4,1.25-half_height])
      circle(d=2.5, $fn=30);
    translate([-4, half_height-3])
      circle(d=2.5, $fn=30);

    translate([0,5.9])
      circle(d=2.8, $fn=30);
    translate([-0.5, 5.9])
      square([1, half_height-6.9]);
    translate([1-half_width, half_height-1.5])
      square([half_width*2-2, 1]);
    translate([1-half_width, half_height-1])
      circle(d=2.5, $fn=30);
    translate([half_width-1, half_height-1])
      circle(d=2.5, $fn=30);
  }
}

module switch_choc_v1_pcb_outline(width=1, height=1) {
  pcb_switch_outline(width=width, height=height);
}
// file: ../../lib/switches/mx.scad
include <../variables.scad>
include <stabilizers.scad>
include <footprints.scad>
include <base.scad>
include <rgb.scad>

module switch_mx_pcb_drill(width=1, height=1, rgb=true, single=true, connections=["hole","hole","hole","hole"]) {
  half_width = u_mm(width)/2;
  half_height = u_mm(height)/2;
  translate([hole_offset(width), half_height]) {
    stab_holes(width);
  }

  switch_base_pcb_drill(width=width, height=height, single=single, rgb=rgb, connections=connections) {
    circle(d=4,$fn=40);
    translate([-3.8,-2.5,0])
      circle(d=1.7,$fn=40);
    translate([2.5,-5,0])
      circle(d=1.7,$fn=40);
    translate([5,0,0])
      circle(d=1.75,$fn=40);
    translate([-5,0,0])
      circle(d=1.75,$fn=40);

    // Column
    translate([-1.2,-3,0])
      circle(d=1,$fn=40);
    translate([5,-2,0])
      circle(d=1,$fn=40);
    if(single){
      translate([6,-3.7,0])
        circle(d=1,$fn=40);
      if(rgb) {
        translate([5,1.7,0])
          circle(d=1,$fn=40);
      } else {
        translate([6,-8.3,0])
          circle(d=1,$fn=40);
      }
    }
  }
}

module switch_mx_pcb_traces(width=1, height=1, rgb=true, single=true, xpos=0, ypos=0, connections=["hole","hole","hole","hole"], last_xpos=0, last_ypos=0) {
  half_width = u_mm(width)/2;
  half_height = u_mm(height)/2;
  switch_base_pcb_traces(width=width, height=height, rgb=rgb, xpos=xpos, ypos=ypos, connections=connections, last_xpos=last_xpos, last_ypos=last_ypos, single=single) {
    translate([-3.8,-2.5,0])
      circle(d=4,$fn=40);
    translate([2.5,-5,0])
      circle(d=4,$fn=40);

    // Row
    v_left = connections[3] == "none" ? 1 : half_width;
    v_right = connections[2] == "none" ? 1 : half_width-5;
    translate([1-v_left,-5.9,0])
      square([v_left+v_right+3,0.8]);

    // Column
    translate([-1.2,-3,0])
      circle(d=2.5,$fn=40);
    translate([5,-2,0])
      circle(d=2.5,$fn=40);
    if(single){
      translate([6,-3.7,0])
        circle(d=2.5,$fn=40);
      difference() {
        translate([5,0,0])
          circle(d=3.55,$fn=40);
        translate([5,-2,0])
          square(4);
      }
      if(rgb) {
        translate([5,1.7,0])
          circle(d=2.3,$fn=40);
      } else {
        translate([4.2,1])
          square([0.8, half_height-2]);
        translate([-1,half_height-1.5])
          square([6,0.8]);
        translate([6,-8.3,0])
          circle(d=2.5,$fn=40);
        translate([-1.3,-8.7,0])
          square([7,0.8]);
      }
    }
  }
}

module switch_mx_pcb_traces_bottom(width=1, height=1, rgb=true, xpos=0, ypos=0, connections=["hole","hole","hole","hole"], last_xpos=0, last_ypos=0) {
  half_width = u_mm(width)/2;
  half_height = u_mm(height)/2;
  switch_base_pcb_traces_bottom(width=width, height=height, rgb=rgb, xpos=xpos, ypos=ypos, connections=connections, last_xpos=last_xpos, last_ypos=last_ypos) {
    translate([-3.8,-2.5,0])
      circle(d=4,$fn=40);
    translate([2.5,-5,0])
      circle(d=4,$fn=40);

    // Column
    translate([-1.2,-3,0])
      circle(d=2.5,$fn=40);
    translate([5,-2,0])
      circle(d=2.5,$fn=40);
    difference(){
      translate([2.5,-5,0])
        circle(d=5.9,$fn=40);
      translate([2.5,-5,0])
        circle(d=4.1,$fn=40);
      translate([0.3,-7,0])
        rotate(45)
          square(6);
    }
    translate([3.85,-3.45])
      square([0.8, 1]);

    t_height = connections[0] == "none" ? 1 : half_height-7.8;
    echo("h", 2-half_height, t_height);
    translate([-1.3,-t_height-6.8])
      square([0.8, t_height]);
    translate([-1.3,-7.2])
      square([2.2,0.8]);
    difference() {
      translate([5,0,0])
        circle(d=3.35,$fn=40);
      translate([5,-2,0])
        square(4);
    }
    b_height = connections[1] == "none" ? 2 : half_height-2;
    translate([4.2,1])
      square([0.8, b_height]);
    if(connections[1] != "none")
      translate([-1,half_height-1.5])
        square([6,0.8]);
  }
}

module switch_mx_pcb_outline(width=1, height=1) {
  pcb_switch_outline(width=width, height=height);
}
// file: ../../lib/utilities.scad
function reverse(list) = len(list) > 0 ? [for (i = [1:len(list)]) list[len(list)-i]] : [];
function pop(list) = len(list) > 0 ? [for (i = [0:len(list)-1]) if (i != 0) list[i]] : [];
// file: ../../lib/switches.scad
use <utilities.scad>
include <switches/mx.scad>
include <switches/choc_v1.scad>

module rotate_translate(rotation, xpos, ypos) {
  if(rotation[0] == undef || rotation[0] == 0) {
    translate([u_mm(xpos), u_mm(ypos), 0]) {
      children();
    }
  } else {
    xoff = rotation[1] == undef ? 0 : rotation[1];
    yoff = rotation[2] == undef ? 0 : rotation[2];
    angle = rotation[0] == undef ? 0 : rotation[0];
    translate([u_mm(xpos - xoff), u_mm(ypos - yoff), 0])
      rotate(angle)
        translate([u_mm(xoff), u_mm(yoff), 0])
          children();
  }
}

module switch(type, style="mx", rgb=true, xpos=0, ypos=0, width=1, cnc=false, rotation=[0,0,0], connections=["hole","hole","hole","hole"], last_xpos=0, last_ypos=0) {
  rotate_translate(rotation, xpos, ypos) {
    if(type == "outline")
      pcb_switch_outline(width=width);
    if(style == "mx") {
      if(type == "key")
        pcb_switch_space_outline(width=width, cnc=cnc, style="mx");
      if(type == "traces")
        switch_mx_pcb_traces(width=width, rgb=rgb, xpos=xpos, ypos=ypos, connections=connections, last_xpos=last_xpos, last_ypos=last_ypos);
      if(type == "traces_top")
        switch_mx_pcb_traces(width=width, single=false, rgb=rgb, xpos=xpos, ypos=ypos, connections=connections, last_xpos=last_xpos, last_ypos=last_ypos);
      if(type == "traces_bottom")
        switch_mx_pcb_traces_bottom(width=width, rgb=rgb, xpos=xpos, ypos=ypos, connections=connections, last_xpos=last_xpos, last_ypos=last_ypos);
      if(type == "drill")
        switch_mx_pcb_drill(width=width, rgb=rgb, connections=connections);
      if(type == "drill_double")
        switch_mx_pcb_drill(width=width, single=false, rgb=rgb, connections=connections);
    }

    if(style == "choc_v1") {
      if(type == "key")
        pcb_switch_space_outline(width=width, cnc=cnc, style="choc_v1");
      if(type == "traces")
        switch_choc_v1_pcb_traces(width=width);
      if(type == "traces_top")
        switch_choc_v1_pcb_traces(width=width);
      if(type == "traces_bottom")
        assert(false, "traces_bottom is incompatible with choc_v1");
      if(type == "drill")
        switch_choc_v1_pcb_drill(width=width);
      if(type == "drill_double")
        switch_choc_v1_pcb_drill(width=width, single=false);
    }

    if(style == "redragon") {
      if(type == "key")
        pcb_switch_space_outline(width=width, cnc=cnc, style="redragon");
      if(type == "traces")
        switch_mx_pcb_traces(width=width, rgb=rgb);
      if(type == "traces_top")
        switch_mx_pcb_traces(width=width, single=false, rgb=rgb);
      if(type == "traces_bottom")
        switch_mx_pcb_traces_bottom(width=width, rgb=rgb);
      if(type == "traces")
        switch_mx_pcb_traces(width=width, rgb=rgb);
      if(type == "drill")
        switch_mx_pcb_drill(width=width);
      if(type == "drill_double")
        switch_mx_pcb_drill(width=width, single=false);
    }
  }
}

module switch_row(keys, style="mx", rgb=true, margin=5, thickness=10, depth=0, cnc=false, type="key", last_row=[], last_xpos=0, previous_xpos=0, last_ypos=0, previous_ypos=0) {
  width = keys[0][0] == undef ? 1 : keys[0][0];
  xpos = keys[0][1] == undef ? 0 : keys[0][1];
  ypos = keys[0][2] == undef ? 0 : keys[0][2];
  rotation = keys[0][3] == undef ? [0,0,0] : keys[0][3];
  connections = keys[0][4] == undef ? ["hole","hole","hole","hole"] : keys[0][4];
  last_ypos = last_row[0][2] == undef ? last_ypos - previous_ypos : last_row[0][2]+last_ypos - previous_ypos;
  last_xpos = last_row[0][1] == undef ? last_xpos - previous_xpos : last_row[0][1]+last_xpos - previous_xpos;
  switch(type, style=style, rgb=rgb, xpos=xpos, ypos=ypos, width=width, cnc=cnc, rotation=rotation, connections=connections, last_xpos=last_xpos, last_ypos=last_ypos);
  if(len(keys) > 1) {
    translate([xpos*key_size+width*key_size, ypos*key_size, 0])
      switch_row(pop(keys), style=style, rgb=rgb, margin=margin, thickness=thickness, depth=depth, cnc=cnc, type=type, last_row = pop(last_row), last_xpos=last_xpos, previous_xpos=xpos, last_ypos=last_ypos, previous_ypos=ypos);
  }
}

module switches(switches, style="mx", rgb=true, margin=5, thickness=10, depth=0, cnc=false, type="key", last_row=[]) {
  if(len(switches) != 0) {
    switch_row(switches[0], style=style, rgb=rgb, margin=margin, thickness=thickness, depth=depth, cnc=cnc, type=type, last_row=last_row);
    if(len(switches) > 1) {
      last_row = switches[0];
      translate([0, key_size, 0])
        switches(pop(switches), style=style, rgb=rgb, margin=margin, depth=depth, thickness=thickness, cnc=cnc, type=type, last_row=last_row);
    }
  }
}
// file: ../../lib/case.scad
include <variables.scad>
use <utilities.scad>
use <circuits.scad>

function key_width(key) = (key[0] == undef ? 1 : key[0]) + (key[1] == undef ? 0 : key[1]);
function width_row(row) = len(row) == 0 ? 0 : key_width(row[0]) + width_row(pop(row));
function width_board(rows) = len(rows) == 0 ? 0 : (
  let (current = width_row(rows[0]))
  let (next = width_board(pop(rows)))
    current > next ? current : next);

function key_height(key) = (key[2] == undef ? 0 : key[2]);
function height_row(row) = len(row) == 0 ? [0,0] : (
  let(other_rows = height_row(pop(row)))
  let(current = key_height(row[0]) + other_rows[0])
  let(maximum = current > other_rows[1] ? current : other_rows[1])
  [current, maximum]);
function height_board_rec(rows) = len(rows) == 0 ? 0 : (
  let (current = height_row(reverse(rows[0]))[1])
  let (next = height_board_rec(pop(rows)))
    current > next ? current : next);
function height_board(rows) = 
  let (height_rec = height_board_rec(rows))
    len(rows) + (height_rec > 0 ? height_rec : 0);

module case(rows, style="mx", margin=5, thickness=5, depth=0, radius=2, rest=0, circuits=[], _inherit_children="unset") {
  total_thickness = thickness + depth + height_for_style(style);
  z_offset = depth + height_for_style(style);
  if($children != 0 && (_inherit_children == "unset" || _inherit_children > 0)) {
    translate([0, 0, -z_offset])
      linear_extrude(total_thickness)
        offset(margin)
          children();
  } else {
    width=u_mm(width_board(rows))+margin*2;
    height=u_mm(height_board(rows))+margin*2+rest;
    translate([-margin, -margin, -z_offset]){
      translate([radius, 0, 0])
        cube([width-radius*2, height,total_thickness]);
      translate([0, radius, 0])
        cube([width, height-radius*2,total_thickness]);
      translate([radius, radius, 0])
        cylinder(total_thickness,radius,radius, $fn=60);
      translate([width-radius, radius, 0])
        cylinder(total_thickness,radius,radius, $fn=60);
      translate([width-radius, height-radius, 0])
        cylinder(total_thickness,radius,radius, $fn=60);
      translate([radius, height-radius, 0])
        cylinder(total_thickness,radius,radius, $fn=60);
    }
    if(len(circuits) > 0)
      translate([0, 0, -z_offset])
        linear_extrude(total_thickness)
          offset(margin)
            circuits_pcb_outline(circuits);
  }
}
// file: ../../lib/variables.scad
key_size=19.05;
hole=14;

function u_mm(u) = u*key_size;
function hole_offset(u) = (key_size-hole)/2+u_mm(u-1)/2;

// This is used to determine how much space is between the top
// of the plate and the PCB.
function height_for_style(style) = style == "mx"        ? 5.334 :
                                   style == "redragon" ? 3.75  :
                                   style == "choc_v1"   ? 2.2   :  "invalid style";
// main file
use <../../keyboard.scad>

layout = [
  [[],[]],
  [[],[]]
];
board(layout, depth=6)
  translate([u_mm(1),u_mm(1),0])
    circle(d=u_mm(3));
